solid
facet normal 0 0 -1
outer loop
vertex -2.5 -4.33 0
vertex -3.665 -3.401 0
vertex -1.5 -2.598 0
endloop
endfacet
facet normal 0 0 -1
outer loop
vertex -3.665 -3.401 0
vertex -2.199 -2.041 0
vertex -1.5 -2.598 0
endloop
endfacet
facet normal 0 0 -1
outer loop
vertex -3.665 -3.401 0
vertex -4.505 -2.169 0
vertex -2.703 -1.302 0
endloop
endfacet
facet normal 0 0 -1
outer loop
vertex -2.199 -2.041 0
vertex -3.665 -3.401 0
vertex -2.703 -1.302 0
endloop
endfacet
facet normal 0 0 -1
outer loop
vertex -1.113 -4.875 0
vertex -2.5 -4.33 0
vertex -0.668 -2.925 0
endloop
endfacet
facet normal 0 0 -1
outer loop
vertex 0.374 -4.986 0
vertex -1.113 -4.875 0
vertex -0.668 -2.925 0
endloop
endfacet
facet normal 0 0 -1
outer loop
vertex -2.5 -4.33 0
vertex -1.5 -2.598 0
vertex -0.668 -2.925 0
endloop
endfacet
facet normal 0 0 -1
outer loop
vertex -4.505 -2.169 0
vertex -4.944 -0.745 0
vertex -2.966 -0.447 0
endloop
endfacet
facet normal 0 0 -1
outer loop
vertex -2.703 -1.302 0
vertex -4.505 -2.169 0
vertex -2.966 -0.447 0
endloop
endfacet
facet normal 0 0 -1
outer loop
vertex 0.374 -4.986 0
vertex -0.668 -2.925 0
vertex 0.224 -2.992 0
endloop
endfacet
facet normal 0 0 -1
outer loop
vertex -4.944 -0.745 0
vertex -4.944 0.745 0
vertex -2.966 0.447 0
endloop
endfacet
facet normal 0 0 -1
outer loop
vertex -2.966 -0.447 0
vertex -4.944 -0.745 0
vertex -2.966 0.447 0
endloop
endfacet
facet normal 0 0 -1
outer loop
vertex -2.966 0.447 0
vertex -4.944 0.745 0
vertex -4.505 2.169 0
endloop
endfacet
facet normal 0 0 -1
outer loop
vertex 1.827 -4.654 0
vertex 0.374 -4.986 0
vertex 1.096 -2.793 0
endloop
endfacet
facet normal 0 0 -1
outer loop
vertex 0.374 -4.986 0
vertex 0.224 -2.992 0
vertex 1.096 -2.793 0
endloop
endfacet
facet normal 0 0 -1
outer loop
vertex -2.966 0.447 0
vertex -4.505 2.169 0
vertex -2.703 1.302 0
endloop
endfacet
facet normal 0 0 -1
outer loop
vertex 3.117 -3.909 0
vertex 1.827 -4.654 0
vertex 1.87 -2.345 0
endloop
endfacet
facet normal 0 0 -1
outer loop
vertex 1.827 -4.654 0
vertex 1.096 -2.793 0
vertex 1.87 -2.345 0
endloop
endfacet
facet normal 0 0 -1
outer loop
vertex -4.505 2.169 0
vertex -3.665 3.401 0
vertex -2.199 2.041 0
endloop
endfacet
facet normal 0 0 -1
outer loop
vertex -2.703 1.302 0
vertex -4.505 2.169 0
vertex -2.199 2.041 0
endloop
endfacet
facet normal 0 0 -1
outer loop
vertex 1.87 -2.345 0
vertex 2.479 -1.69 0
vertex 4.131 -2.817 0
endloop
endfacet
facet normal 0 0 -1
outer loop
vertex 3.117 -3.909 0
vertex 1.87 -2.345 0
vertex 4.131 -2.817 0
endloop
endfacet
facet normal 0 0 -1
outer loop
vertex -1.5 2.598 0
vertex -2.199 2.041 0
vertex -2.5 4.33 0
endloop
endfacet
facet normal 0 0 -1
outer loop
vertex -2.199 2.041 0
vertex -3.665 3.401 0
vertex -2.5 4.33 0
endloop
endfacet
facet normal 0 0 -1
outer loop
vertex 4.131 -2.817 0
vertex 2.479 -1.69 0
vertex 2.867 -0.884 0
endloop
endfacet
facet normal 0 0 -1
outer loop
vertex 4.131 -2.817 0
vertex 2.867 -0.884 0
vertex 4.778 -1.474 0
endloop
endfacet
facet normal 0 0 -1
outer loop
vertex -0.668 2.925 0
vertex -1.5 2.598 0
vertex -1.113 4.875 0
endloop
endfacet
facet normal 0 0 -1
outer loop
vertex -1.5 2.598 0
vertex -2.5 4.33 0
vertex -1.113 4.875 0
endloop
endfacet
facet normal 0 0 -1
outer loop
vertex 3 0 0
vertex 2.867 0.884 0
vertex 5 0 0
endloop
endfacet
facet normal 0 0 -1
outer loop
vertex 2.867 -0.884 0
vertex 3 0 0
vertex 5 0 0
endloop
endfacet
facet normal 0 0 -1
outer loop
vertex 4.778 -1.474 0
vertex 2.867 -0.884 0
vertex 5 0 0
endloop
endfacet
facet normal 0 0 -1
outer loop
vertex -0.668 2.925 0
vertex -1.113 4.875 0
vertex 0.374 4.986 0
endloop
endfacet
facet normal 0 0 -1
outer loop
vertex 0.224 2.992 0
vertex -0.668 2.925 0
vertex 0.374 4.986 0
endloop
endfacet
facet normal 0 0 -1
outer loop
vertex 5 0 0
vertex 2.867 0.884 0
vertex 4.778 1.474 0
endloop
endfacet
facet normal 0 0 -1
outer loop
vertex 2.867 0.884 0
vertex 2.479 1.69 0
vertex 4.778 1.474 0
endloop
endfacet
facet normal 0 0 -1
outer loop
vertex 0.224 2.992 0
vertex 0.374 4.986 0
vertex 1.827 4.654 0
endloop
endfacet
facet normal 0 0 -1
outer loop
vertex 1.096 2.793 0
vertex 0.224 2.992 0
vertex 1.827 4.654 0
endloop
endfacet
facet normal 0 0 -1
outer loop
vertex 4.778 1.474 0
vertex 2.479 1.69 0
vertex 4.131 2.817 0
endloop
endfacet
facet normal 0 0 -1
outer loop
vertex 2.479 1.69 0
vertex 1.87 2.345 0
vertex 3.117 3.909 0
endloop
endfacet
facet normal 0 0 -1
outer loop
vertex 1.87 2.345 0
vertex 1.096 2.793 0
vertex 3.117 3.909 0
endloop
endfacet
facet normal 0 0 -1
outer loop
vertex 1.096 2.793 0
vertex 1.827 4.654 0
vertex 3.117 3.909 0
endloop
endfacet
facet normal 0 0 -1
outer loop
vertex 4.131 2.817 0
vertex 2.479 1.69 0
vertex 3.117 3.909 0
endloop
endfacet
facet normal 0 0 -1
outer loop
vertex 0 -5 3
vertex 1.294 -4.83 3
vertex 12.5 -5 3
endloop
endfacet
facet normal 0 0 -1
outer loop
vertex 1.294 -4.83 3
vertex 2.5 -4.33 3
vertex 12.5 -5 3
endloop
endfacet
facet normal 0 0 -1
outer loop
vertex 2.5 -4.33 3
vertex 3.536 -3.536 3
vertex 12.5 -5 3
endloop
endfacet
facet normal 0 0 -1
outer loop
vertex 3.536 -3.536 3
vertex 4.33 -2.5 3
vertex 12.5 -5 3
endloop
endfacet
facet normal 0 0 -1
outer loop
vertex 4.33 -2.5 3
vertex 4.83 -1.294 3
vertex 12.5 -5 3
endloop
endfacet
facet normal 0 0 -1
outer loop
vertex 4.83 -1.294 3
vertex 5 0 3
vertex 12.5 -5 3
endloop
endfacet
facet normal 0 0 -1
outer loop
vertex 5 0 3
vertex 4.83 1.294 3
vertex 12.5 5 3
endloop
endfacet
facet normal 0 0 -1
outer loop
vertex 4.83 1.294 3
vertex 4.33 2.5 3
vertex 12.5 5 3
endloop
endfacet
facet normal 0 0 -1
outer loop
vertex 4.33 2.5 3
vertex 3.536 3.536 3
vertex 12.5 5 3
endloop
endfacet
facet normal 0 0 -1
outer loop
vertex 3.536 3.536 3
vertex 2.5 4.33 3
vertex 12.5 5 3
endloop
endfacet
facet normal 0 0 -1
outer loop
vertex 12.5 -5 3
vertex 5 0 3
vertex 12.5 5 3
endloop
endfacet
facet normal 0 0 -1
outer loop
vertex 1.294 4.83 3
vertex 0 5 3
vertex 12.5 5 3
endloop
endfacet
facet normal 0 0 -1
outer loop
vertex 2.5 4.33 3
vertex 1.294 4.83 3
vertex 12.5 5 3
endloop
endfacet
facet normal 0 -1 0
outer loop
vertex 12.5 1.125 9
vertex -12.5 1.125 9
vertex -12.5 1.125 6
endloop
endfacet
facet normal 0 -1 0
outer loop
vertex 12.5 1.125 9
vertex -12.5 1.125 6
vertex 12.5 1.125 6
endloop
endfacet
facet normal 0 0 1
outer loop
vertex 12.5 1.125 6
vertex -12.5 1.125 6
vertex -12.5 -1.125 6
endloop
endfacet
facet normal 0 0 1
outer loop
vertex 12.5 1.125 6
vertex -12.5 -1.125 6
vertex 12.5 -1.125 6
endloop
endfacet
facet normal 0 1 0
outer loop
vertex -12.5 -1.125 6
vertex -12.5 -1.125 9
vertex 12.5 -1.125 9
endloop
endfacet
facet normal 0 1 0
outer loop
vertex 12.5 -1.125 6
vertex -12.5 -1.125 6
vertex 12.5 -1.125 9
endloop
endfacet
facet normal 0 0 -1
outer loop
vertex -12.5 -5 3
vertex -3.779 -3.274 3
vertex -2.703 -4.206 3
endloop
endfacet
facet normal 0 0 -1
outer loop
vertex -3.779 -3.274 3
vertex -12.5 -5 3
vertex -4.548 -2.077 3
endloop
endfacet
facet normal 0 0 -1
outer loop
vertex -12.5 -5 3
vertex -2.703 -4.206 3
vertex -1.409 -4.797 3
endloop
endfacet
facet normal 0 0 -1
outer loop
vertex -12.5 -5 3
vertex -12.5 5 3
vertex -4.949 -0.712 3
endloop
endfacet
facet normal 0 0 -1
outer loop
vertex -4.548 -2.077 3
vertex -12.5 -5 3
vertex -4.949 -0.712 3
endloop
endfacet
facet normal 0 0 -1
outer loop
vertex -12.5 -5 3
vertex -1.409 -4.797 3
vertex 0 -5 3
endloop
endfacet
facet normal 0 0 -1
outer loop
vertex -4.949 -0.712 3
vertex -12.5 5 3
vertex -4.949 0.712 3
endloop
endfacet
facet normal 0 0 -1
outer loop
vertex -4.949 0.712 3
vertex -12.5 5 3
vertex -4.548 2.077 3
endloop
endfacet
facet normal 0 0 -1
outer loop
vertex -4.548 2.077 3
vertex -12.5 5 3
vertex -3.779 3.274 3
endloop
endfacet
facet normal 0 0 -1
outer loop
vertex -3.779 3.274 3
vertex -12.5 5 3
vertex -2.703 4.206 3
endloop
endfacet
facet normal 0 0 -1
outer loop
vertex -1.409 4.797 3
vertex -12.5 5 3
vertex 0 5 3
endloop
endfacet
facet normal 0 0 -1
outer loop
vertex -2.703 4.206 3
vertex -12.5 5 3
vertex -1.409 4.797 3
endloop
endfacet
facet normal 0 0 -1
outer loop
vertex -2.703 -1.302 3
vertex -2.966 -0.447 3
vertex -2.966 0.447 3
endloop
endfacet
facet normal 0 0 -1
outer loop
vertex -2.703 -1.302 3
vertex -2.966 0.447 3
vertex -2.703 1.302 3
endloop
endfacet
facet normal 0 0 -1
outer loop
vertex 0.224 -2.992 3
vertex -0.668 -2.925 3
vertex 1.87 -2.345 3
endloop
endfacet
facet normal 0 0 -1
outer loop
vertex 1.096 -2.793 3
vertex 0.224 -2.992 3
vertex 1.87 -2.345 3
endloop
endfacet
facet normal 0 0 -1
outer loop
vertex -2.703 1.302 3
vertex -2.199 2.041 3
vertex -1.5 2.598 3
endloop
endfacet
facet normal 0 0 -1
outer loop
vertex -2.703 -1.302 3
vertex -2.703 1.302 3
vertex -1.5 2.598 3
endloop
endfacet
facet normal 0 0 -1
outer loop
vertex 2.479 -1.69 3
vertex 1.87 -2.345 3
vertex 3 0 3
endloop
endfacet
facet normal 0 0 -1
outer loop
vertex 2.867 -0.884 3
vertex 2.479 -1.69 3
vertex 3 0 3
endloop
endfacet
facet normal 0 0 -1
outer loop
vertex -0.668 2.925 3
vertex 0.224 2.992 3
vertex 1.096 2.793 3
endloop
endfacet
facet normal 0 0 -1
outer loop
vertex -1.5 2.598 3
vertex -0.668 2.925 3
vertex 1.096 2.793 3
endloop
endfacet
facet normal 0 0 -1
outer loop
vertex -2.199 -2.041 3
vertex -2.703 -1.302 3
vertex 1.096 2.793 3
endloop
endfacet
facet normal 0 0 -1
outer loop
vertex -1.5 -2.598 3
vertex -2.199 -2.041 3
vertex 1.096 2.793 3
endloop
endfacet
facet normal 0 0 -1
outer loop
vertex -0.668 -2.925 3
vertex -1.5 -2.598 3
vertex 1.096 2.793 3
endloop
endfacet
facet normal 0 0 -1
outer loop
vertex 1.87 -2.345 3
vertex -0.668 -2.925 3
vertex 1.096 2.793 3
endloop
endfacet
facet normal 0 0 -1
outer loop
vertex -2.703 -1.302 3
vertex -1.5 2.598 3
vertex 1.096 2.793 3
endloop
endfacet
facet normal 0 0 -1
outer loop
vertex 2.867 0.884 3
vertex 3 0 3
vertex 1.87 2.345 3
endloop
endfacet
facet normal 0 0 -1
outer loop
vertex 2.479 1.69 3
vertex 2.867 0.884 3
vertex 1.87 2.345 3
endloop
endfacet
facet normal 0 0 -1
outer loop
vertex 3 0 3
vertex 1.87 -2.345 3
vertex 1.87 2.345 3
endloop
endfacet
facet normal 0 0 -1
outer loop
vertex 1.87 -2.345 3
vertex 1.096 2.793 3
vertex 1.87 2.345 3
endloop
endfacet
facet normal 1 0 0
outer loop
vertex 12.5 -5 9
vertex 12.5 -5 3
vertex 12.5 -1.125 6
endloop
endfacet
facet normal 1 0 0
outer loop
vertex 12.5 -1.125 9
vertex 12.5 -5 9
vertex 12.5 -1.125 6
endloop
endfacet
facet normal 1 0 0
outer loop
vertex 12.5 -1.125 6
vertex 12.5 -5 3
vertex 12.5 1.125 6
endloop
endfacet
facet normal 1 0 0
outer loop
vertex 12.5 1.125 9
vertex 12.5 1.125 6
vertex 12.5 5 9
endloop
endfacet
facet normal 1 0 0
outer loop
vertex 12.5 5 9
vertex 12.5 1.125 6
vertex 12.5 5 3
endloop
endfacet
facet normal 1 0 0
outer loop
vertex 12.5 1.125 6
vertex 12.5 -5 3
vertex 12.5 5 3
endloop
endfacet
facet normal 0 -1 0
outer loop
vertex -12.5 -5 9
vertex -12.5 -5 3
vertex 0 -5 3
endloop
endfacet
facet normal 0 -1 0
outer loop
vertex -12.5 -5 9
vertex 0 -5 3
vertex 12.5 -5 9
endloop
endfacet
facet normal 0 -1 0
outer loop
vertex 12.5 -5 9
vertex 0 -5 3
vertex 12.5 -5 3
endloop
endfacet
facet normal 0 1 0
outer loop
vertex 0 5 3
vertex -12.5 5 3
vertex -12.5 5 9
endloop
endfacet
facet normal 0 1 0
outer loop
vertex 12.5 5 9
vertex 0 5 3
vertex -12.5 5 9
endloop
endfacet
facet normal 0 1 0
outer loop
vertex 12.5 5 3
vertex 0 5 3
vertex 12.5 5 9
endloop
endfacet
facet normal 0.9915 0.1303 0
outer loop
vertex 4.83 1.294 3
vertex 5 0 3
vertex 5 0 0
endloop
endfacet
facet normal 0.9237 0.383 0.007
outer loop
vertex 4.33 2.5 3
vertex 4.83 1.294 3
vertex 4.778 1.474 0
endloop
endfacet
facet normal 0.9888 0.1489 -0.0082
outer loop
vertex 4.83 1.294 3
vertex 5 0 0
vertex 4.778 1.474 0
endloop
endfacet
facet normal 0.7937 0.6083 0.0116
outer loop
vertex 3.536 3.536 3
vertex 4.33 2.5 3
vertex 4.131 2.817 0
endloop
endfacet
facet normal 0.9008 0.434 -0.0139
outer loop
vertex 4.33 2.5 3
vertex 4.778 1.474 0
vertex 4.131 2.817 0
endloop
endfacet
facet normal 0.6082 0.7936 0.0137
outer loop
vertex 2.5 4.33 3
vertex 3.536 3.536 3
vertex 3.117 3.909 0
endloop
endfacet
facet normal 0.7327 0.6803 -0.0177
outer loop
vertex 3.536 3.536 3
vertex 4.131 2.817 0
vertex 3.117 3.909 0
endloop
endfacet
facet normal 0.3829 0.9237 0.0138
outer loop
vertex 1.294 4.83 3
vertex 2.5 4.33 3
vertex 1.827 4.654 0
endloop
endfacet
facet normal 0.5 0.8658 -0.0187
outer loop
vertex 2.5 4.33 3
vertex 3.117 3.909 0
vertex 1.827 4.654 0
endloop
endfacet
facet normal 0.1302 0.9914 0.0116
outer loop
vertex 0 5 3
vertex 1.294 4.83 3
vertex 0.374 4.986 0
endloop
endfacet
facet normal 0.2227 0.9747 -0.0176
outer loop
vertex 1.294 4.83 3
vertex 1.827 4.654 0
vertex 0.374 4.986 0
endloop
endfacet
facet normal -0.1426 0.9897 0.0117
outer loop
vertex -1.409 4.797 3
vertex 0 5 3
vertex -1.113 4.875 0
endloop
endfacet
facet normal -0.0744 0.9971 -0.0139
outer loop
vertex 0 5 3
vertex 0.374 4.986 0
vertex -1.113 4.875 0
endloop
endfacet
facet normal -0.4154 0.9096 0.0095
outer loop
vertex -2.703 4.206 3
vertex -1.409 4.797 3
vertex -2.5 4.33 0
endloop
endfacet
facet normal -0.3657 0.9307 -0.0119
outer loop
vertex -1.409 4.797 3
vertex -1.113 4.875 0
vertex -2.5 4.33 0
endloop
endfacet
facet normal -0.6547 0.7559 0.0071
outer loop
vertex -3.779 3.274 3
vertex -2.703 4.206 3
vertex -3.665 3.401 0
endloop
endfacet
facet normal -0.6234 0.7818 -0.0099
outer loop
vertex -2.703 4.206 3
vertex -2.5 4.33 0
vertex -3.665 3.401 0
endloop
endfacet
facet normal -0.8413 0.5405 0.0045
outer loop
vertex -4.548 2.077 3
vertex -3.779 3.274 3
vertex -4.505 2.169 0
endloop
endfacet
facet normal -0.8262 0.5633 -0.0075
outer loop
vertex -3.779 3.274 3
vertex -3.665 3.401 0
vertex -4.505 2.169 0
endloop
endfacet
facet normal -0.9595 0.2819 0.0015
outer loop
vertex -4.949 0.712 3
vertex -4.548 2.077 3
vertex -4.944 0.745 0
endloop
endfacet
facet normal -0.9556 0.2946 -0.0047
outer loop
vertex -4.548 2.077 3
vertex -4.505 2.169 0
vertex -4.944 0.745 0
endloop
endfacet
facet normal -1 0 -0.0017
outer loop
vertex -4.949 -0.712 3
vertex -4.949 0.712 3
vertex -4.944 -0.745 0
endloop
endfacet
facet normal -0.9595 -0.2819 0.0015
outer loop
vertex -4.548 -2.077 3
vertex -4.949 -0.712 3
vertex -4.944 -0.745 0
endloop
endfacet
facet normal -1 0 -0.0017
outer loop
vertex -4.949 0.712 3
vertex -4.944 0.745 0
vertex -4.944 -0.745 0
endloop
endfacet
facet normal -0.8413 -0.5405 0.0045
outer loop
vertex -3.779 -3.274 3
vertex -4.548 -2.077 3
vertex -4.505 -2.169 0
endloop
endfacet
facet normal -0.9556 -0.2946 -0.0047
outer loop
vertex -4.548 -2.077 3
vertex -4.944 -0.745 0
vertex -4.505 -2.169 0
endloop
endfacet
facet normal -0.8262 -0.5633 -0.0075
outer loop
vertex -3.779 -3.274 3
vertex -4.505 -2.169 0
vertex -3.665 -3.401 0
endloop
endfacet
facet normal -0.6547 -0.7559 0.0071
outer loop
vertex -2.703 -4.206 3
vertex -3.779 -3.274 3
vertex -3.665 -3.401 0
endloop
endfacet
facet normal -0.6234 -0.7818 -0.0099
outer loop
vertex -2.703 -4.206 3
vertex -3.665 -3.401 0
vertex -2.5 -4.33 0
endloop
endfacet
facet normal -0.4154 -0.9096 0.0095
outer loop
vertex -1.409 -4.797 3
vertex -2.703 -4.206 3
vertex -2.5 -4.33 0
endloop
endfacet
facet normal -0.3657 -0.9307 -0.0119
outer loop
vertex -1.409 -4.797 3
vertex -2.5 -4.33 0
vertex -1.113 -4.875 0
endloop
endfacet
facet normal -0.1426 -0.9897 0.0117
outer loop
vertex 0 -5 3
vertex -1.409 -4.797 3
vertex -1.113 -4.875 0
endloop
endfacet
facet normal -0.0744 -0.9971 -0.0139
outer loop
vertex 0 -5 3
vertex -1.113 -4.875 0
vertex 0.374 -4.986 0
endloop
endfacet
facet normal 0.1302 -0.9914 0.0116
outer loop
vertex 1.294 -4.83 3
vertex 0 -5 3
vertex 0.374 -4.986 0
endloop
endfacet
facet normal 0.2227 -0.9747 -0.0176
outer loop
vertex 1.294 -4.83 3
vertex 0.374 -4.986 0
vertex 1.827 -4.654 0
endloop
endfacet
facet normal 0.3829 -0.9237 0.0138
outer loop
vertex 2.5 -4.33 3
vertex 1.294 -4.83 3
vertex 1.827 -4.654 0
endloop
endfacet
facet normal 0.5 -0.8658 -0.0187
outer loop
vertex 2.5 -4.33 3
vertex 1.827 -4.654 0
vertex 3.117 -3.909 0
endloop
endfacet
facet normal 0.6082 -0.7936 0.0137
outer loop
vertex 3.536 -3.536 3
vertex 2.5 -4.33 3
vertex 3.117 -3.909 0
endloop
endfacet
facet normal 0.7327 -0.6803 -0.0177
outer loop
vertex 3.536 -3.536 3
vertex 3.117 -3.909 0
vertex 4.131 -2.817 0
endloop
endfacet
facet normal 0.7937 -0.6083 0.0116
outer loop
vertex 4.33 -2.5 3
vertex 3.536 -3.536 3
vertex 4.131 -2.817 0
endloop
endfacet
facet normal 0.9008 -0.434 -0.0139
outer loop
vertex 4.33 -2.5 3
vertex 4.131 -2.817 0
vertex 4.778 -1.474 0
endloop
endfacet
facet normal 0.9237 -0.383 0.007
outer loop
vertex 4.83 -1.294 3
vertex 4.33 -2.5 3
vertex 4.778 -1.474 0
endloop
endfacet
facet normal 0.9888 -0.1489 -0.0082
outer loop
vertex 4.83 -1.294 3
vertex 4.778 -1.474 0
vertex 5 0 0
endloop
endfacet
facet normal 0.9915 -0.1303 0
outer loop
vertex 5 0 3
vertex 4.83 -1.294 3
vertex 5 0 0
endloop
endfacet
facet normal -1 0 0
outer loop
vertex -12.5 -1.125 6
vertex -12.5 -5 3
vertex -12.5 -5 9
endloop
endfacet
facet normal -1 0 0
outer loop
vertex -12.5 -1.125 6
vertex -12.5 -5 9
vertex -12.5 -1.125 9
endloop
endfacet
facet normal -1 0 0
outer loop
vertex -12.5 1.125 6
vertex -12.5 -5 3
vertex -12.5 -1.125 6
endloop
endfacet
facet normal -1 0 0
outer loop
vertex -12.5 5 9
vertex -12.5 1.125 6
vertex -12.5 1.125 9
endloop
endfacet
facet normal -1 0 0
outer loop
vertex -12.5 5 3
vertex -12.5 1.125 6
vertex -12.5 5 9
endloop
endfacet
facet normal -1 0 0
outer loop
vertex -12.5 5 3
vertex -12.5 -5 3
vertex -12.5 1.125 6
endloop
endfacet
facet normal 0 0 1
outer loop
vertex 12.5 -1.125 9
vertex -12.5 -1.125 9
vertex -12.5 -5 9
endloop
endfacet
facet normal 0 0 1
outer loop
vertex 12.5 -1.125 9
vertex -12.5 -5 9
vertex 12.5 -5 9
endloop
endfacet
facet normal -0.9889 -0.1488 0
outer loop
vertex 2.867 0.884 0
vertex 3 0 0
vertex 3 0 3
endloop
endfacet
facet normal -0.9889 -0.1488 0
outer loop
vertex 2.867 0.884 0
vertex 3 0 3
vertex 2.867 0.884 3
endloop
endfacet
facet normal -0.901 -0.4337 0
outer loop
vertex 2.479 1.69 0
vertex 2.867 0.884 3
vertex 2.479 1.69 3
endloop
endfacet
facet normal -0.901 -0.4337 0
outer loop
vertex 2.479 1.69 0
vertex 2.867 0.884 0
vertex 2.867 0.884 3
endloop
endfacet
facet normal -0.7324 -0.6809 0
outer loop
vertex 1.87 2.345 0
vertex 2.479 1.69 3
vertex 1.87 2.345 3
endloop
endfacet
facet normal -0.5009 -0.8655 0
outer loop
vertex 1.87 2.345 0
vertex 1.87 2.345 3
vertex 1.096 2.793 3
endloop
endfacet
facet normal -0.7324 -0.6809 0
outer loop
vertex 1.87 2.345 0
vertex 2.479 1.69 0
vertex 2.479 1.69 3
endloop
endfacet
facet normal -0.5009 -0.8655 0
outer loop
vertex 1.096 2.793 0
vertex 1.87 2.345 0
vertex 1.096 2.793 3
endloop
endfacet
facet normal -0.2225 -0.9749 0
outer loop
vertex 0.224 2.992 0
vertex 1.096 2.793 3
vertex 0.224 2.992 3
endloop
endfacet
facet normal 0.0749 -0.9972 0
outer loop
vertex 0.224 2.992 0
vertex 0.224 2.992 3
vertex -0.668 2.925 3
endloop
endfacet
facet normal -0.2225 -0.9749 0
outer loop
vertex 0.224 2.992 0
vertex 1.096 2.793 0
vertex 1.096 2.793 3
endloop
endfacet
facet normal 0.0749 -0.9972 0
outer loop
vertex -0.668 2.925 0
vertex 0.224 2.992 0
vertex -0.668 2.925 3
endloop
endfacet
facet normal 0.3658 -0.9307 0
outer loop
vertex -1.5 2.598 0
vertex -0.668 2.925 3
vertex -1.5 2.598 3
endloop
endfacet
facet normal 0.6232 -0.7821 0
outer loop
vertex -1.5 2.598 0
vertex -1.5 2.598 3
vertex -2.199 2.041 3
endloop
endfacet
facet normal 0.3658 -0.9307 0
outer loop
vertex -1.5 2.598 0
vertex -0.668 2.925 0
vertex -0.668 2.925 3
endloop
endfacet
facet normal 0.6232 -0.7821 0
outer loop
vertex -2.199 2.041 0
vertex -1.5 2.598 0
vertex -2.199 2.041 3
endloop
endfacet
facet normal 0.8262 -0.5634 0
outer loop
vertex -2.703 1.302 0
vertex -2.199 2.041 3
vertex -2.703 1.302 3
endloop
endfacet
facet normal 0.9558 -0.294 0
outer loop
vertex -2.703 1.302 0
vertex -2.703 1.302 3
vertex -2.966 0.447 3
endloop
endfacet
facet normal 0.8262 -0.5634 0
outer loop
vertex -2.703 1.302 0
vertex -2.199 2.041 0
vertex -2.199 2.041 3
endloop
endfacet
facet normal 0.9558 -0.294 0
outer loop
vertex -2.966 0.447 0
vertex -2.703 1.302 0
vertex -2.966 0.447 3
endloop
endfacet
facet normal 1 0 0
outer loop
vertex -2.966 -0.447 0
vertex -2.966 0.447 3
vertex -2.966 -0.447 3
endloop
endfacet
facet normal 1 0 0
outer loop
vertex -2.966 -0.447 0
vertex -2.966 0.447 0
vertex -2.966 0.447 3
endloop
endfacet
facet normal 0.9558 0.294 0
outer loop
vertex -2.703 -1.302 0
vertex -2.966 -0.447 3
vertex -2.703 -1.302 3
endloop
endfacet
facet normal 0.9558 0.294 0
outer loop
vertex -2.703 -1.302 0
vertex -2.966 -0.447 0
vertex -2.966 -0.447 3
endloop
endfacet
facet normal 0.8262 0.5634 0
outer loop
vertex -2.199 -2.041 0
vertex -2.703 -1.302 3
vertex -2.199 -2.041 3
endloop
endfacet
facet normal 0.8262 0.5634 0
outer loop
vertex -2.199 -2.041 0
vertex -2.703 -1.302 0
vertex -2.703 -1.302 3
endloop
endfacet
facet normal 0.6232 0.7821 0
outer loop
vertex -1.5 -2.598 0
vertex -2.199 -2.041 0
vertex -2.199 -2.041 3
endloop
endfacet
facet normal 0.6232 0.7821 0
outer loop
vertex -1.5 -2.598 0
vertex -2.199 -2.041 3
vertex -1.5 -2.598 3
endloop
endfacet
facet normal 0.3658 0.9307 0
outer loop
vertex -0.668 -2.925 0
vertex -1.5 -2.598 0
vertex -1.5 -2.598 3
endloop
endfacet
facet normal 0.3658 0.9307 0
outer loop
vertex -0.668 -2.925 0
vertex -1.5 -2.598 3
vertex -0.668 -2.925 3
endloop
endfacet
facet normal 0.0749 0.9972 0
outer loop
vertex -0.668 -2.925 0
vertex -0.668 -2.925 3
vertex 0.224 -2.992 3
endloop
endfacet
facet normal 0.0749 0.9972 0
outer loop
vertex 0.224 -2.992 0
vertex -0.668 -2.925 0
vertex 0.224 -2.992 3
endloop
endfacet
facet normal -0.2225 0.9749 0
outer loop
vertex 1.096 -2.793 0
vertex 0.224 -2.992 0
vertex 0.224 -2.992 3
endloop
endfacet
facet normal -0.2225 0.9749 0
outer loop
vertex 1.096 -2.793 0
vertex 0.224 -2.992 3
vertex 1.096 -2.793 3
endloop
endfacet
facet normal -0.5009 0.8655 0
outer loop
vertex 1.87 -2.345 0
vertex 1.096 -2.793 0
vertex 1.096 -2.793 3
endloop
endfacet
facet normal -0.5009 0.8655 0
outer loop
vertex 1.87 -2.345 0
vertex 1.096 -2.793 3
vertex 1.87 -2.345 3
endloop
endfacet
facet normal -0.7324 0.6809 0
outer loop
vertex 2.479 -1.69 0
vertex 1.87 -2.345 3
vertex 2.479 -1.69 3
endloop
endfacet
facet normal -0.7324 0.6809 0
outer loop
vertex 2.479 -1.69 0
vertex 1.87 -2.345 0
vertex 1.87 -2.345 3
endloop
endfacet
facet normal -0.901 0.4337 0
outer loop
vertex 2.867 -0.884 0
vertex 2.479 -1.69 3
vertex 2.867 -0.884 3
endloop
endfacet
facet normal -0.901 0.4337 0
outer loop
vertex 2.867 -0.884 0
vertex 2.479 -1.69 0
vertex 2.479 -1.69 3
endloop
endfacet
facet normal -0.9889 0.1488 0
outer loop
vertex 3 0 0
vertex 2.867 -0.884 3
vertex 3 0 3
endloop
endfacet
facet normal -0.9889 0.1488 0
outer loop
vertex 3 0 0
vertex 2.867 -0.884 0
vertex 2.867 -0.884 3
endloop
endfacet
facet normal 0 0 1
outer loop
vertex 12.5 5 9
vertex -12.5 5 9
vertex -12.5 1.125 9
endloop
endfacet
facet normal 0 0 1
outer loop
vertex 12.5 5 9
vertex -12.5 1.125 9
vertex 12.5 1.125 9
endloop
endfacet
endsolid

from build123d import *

# Parameters (mm, degrees)
F0_R     = 5
F1_DEPTH = 3
F2_R     = 3
F3_DEPTH = 3
F4_W     = 25
F4_H     = 10
F5_DEPTH = 6
F6_W     = 25
F6_H     = 2.25
F7_DEPTH = 3


with BuildPart() as f1:
    # F0 (on Top) → F1 (new body)
    with BuildSketch(Plane.XY):
        Circle(F0_R)
    extrude(amount=F1_DEPTH)

    # F2 (on Top) → F3 (cut)
    with BuildSketch(Plane.XY):
        Circle(F2_R)
    extrude(amount=F3_DEPTH, mode=Mode.SUBTRACT)

    # F4 (on face) → F5 (join)
    with BuildSketch(Plane.XY.offset(3)):
        Rectangle(F4_W, F4_H)
    extrude(amount=F5_DEPTH)

    # F6 (on face) → F7 (cut)
    with BuildSketch(Plane.XY.offset(9)):
        Rectangle(F6_W, F6_H)
    extrude(amount=-F7_DEPTH, mode=Mode.SUBTRACT)


solid = f1.part
